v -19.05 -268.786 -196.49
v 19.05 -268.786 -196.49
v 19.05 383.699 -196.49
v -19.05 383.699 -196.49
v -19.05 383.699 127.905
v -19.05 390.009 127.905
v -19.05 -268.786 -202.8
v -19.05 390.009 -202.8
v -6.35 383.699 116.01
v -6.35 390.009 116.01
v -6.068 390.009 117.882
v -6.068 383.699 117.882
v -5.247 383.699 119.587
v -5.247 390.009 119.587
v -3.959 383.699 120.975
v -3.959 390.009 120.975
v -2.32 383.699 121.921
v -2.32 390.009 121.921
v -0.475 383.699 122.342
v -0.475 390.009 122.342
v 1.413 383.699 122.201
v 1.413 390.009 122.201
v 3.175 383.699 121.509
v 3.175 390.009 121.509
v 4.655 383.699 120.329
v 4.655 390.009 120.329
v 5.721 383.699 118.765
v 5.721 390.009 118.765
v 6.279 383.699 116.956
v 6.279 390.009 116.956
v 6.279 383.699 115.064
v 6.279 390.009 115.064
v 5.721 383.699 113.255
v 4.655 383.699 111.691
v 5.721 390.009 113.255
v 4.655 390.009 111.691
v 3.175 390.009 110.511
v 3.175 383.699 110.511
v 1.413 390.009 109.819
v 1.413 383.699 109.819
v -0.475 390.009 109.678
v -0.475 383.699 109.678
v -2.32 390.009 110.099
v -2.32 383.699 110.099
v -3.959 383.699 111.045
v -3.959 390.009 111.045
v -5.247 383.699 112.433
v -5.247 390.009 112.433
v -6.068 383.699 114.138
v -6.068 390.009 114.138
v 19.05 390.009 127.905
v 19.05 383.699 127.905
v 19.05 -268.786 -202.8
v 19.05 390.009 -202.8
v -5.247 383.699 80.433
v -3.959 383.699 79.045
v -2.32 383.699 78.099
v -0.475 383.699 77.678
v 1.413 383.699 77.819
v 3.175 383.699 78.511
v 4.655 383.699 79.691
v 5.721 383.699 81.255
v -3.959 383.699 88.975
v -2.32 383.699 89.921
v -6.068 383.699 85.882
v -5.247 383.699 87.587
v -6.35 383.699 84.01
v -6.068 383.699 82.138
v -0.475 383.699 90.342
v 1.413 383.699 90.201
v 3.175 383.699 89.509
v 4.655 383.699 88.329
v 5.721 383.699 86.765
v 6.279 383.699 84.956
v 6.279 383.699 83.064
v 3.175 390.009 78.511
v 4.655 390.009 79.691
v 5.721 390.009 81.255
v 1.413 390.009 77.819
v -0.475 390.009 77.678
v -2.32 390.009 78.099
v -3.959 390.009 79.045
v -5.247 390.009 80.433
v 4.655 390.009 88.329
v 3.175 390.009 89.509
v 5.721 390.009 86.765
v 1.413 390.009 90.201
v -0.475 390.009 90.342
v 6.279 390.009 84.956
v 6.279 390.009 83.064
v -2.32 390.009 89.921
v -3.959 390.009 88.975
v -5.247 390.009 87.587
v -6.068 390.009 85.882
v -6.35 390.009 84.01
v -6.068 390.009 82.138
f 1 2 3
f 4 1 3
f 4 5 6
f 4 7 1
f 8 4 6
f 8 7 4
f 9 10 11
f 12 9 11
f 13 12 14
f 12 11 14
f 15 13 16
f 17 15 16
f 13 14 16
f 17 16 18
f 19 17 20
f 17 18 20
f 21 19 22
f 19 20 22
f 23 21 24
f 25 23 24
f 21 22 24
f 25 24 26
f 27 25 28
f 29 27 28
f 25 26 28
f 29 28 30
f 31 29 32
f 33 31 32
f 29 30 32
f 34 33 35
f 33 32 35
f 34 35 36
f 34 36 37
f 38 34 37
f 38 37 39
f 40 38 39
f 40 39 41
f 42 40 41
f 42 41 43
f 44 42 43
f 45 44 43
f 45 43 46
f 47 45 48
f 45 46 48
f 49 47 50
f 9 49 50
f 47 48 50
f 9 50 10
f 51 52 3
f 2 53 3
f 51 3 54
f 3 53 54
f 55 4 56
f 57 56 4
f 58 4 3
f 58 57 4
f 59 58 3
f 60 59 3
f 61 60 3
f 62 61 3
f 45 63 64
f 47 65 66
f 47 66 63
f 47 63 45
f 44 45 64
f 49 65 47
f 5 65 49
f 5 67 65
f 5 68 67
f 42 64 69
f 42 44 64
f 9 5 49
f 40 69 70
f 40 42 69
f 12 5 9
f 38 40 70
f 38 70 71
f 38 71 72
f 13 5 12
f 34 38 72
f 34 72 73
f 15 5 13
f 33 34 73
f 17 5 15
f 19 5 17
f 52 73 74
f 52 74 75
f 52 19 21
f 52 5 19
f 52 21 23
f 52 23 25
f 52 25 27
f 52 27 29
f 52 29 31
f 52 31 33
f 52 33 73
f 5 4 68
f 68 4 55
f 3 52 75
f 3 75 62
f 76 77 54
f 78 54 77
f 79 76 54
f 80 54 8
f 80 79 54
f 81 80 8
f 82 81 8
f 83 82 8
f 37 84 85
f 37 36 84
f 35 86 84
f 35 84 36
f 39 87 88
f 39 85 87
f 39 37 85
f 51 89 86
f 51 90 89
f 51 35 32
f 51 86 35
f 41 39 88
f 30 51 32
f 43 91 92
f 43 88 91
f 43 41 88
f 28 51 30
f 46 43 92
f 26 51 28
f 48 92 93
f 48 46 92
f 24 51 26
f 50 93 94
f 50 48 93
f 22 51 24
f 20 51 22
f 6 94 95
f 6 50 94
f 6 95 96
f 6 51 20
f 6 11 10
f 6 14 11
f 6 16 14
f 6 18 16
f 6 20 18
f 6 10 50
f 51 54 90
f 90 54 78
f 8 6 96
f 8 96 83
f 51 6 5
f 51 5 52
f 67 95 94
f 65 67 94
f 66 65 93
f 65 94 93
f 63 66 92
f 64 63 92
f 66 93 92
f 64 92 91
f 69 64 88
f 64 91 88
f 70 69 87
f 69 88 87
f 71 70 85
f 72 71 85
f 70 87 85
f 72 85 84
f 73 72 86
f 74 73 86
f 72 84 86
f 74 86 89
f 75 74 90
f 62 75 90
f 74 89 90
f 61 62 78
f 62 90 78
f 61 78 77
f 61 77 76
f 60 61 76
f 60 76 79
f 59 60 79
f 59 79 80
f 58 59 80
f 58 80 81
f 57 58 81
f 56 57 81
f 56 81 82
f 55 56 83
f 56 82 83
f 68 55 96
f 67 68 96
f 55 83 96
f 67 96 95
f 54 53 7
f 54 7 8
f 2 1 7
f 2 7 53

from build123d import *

# Parameters (mm, degrees)
CROQUIS1_W              = 38.1
CROQUIS1_H              = 850.5
SALIENTE_EXTRUIR1_DEPTH = 6.31
CROQUIS2_W              = 38.1
CROQUIS2_H              = 6.31
SALIENTE_EXTRUIR2_DEPTH = 70
CROQUIS3_W              = 38.1
CROQUIS3_H              = 6.31
SALIENTE_EXTRUIR3_DEPTH = 578
CROQUIS4_R              = 6.935856655
CORTAR_EXTRUIR1_DEPTH   = 7
CROQUIS5_W              = 38.1
CROQUIS5_H              = 687.72607772
CORTAR_EXTRUIR2_DEPTH   = 10
CROQUIS6_W              = 38.1
CROQUIS6_H              = 6.31
CROQUIS8_W              = 368.89
CROQUIS8_H              = 6.31
CORTAR_EXTRUIR3_DEPTH   = 147
CROQUIS9_R              = 6.35
CORTAR_EXTRUIR4_DEPTH   = 6.31


with BuildPart() as part:
    # Croquis1 → Saliente-Extruir1 (new body)
    with BuildSketch(Plane.XY):
        Rectangle(CROQUIS1_W, CROQUIS1_H)
    extrude(amount=SALIENTE_EXTRUIR1_DEPTH)

    # Croquis2 → Saliente-Extruir2 (add)
    with BuildSketch(Plane.XY.offset(6.31)):
        with Locations((0, -422.095)):
            Rectangle(CROQUIS2_W, CROQUIS2_H)
    extrude(amount=SALIENTE_EXTRUIR2_DEPTH)

    # Croquis3 → Saliente-Extruir3 (add)
    with BuildSketch(Plane.XY.offset(6.31)):
        with Locations((0, -265.63107772)):
            Rectangle(CROQUIS3_W, CROQUIS3_H)
    extrude(amount=-SALIENTE_EXTRUIR3_DEPTH)

    # Croquis4 → Cortar-Extruir1 (cut)
    with BuildSketch(Plane(origin=(0, -262.47607772, 0), x_dir=(1, 0, 0), z_dir=(0, 1, 0))):
        with Locations(Location((0, 536.981534281, 0), (0, 0, 270))):
            Circle(CROQUIS4_R)
    extrude(amount=-CORTAR_EXTRUIR1_DEPTH, mode=Mode.SUBTRACT)

    # Croquis5 → Cortar-Extruir2 (cut)
    with BuildSketch(Plane(origin=(0, 0, 0), x_dir=(-1, 0, 0), z_dir=(0, 0, -1))):
        with Locations((0, 81.38696114)):
            Rectangle(CROQUIS5_W, CROQUIS5_H)
    extrude(amount=-CORTAR_EXTRUIR2_DEPTH, mode=Mode.SUBTRACT)

    # Barrer1: sweep along a curve in space
    with BuildLine() as barrer1_path:
        Line((0, -262.47607772, -199.645), (0, 386.85392228, -199.645))
        Line((0, 386.85392228, -199.645), (0, 386.85392228, 127.905))
    # Croquis6 → Barrer1 (sweep)
    with BuildSketch(Plane(origin=(0, -262.47607772, 0), x_dir=(1, 0, 0), z_dir=(0, 1, 0))):
        with Locations((0, 199.645)):
            Rectangle(CROQUIS6_W, CROQUIS6_H)
    sweep(path=barrer1_path.line, transition=Transition.RIGHT)

    # Croquis8 → Cortar-Extruir3 (cut)
    with BuildSketch(Plane(origin=(19.05, 0, 0), x_dir=(0, 0, -1), z_dir=(1, 0, 0))):
        Polygon((196.49, -262.47607772), (196.49, -268.78607772), (196.49, -444.307673596), (-90.834600665, -444.307673596), (-90.834600665, -262.47607772), align=None)
        with Locations((387.245, -265.63107772)):
            Rectangle(CROQUIS8_W, CROQUIS8_H)
    extrude(amount=-CORTAR_EXTRUIR3_DEPTH, mode=Mode.SUBTRACT)

    # Croquis9 → Cortar-Extruir4 (cut)
    with BuildSketch(Plane(origin=(0, 390.00892228, 0), x_dir=(1, 0, 0), z_dir=(0, 1, 0))):
        with Locations(Location((0, -84.010000001, 0), (0, 0, 180))):
            Circle(CROQUIS9_R)
        with Locations(Location((0, -116.010000001, 0), (0, 0, 180))):
            Circle(CROQUIS9_R)
    extrude(amount=-CORTAR_EXTRUIR4_DEPTH, mode=Mode.SUBTRACT)


solid = part.part
